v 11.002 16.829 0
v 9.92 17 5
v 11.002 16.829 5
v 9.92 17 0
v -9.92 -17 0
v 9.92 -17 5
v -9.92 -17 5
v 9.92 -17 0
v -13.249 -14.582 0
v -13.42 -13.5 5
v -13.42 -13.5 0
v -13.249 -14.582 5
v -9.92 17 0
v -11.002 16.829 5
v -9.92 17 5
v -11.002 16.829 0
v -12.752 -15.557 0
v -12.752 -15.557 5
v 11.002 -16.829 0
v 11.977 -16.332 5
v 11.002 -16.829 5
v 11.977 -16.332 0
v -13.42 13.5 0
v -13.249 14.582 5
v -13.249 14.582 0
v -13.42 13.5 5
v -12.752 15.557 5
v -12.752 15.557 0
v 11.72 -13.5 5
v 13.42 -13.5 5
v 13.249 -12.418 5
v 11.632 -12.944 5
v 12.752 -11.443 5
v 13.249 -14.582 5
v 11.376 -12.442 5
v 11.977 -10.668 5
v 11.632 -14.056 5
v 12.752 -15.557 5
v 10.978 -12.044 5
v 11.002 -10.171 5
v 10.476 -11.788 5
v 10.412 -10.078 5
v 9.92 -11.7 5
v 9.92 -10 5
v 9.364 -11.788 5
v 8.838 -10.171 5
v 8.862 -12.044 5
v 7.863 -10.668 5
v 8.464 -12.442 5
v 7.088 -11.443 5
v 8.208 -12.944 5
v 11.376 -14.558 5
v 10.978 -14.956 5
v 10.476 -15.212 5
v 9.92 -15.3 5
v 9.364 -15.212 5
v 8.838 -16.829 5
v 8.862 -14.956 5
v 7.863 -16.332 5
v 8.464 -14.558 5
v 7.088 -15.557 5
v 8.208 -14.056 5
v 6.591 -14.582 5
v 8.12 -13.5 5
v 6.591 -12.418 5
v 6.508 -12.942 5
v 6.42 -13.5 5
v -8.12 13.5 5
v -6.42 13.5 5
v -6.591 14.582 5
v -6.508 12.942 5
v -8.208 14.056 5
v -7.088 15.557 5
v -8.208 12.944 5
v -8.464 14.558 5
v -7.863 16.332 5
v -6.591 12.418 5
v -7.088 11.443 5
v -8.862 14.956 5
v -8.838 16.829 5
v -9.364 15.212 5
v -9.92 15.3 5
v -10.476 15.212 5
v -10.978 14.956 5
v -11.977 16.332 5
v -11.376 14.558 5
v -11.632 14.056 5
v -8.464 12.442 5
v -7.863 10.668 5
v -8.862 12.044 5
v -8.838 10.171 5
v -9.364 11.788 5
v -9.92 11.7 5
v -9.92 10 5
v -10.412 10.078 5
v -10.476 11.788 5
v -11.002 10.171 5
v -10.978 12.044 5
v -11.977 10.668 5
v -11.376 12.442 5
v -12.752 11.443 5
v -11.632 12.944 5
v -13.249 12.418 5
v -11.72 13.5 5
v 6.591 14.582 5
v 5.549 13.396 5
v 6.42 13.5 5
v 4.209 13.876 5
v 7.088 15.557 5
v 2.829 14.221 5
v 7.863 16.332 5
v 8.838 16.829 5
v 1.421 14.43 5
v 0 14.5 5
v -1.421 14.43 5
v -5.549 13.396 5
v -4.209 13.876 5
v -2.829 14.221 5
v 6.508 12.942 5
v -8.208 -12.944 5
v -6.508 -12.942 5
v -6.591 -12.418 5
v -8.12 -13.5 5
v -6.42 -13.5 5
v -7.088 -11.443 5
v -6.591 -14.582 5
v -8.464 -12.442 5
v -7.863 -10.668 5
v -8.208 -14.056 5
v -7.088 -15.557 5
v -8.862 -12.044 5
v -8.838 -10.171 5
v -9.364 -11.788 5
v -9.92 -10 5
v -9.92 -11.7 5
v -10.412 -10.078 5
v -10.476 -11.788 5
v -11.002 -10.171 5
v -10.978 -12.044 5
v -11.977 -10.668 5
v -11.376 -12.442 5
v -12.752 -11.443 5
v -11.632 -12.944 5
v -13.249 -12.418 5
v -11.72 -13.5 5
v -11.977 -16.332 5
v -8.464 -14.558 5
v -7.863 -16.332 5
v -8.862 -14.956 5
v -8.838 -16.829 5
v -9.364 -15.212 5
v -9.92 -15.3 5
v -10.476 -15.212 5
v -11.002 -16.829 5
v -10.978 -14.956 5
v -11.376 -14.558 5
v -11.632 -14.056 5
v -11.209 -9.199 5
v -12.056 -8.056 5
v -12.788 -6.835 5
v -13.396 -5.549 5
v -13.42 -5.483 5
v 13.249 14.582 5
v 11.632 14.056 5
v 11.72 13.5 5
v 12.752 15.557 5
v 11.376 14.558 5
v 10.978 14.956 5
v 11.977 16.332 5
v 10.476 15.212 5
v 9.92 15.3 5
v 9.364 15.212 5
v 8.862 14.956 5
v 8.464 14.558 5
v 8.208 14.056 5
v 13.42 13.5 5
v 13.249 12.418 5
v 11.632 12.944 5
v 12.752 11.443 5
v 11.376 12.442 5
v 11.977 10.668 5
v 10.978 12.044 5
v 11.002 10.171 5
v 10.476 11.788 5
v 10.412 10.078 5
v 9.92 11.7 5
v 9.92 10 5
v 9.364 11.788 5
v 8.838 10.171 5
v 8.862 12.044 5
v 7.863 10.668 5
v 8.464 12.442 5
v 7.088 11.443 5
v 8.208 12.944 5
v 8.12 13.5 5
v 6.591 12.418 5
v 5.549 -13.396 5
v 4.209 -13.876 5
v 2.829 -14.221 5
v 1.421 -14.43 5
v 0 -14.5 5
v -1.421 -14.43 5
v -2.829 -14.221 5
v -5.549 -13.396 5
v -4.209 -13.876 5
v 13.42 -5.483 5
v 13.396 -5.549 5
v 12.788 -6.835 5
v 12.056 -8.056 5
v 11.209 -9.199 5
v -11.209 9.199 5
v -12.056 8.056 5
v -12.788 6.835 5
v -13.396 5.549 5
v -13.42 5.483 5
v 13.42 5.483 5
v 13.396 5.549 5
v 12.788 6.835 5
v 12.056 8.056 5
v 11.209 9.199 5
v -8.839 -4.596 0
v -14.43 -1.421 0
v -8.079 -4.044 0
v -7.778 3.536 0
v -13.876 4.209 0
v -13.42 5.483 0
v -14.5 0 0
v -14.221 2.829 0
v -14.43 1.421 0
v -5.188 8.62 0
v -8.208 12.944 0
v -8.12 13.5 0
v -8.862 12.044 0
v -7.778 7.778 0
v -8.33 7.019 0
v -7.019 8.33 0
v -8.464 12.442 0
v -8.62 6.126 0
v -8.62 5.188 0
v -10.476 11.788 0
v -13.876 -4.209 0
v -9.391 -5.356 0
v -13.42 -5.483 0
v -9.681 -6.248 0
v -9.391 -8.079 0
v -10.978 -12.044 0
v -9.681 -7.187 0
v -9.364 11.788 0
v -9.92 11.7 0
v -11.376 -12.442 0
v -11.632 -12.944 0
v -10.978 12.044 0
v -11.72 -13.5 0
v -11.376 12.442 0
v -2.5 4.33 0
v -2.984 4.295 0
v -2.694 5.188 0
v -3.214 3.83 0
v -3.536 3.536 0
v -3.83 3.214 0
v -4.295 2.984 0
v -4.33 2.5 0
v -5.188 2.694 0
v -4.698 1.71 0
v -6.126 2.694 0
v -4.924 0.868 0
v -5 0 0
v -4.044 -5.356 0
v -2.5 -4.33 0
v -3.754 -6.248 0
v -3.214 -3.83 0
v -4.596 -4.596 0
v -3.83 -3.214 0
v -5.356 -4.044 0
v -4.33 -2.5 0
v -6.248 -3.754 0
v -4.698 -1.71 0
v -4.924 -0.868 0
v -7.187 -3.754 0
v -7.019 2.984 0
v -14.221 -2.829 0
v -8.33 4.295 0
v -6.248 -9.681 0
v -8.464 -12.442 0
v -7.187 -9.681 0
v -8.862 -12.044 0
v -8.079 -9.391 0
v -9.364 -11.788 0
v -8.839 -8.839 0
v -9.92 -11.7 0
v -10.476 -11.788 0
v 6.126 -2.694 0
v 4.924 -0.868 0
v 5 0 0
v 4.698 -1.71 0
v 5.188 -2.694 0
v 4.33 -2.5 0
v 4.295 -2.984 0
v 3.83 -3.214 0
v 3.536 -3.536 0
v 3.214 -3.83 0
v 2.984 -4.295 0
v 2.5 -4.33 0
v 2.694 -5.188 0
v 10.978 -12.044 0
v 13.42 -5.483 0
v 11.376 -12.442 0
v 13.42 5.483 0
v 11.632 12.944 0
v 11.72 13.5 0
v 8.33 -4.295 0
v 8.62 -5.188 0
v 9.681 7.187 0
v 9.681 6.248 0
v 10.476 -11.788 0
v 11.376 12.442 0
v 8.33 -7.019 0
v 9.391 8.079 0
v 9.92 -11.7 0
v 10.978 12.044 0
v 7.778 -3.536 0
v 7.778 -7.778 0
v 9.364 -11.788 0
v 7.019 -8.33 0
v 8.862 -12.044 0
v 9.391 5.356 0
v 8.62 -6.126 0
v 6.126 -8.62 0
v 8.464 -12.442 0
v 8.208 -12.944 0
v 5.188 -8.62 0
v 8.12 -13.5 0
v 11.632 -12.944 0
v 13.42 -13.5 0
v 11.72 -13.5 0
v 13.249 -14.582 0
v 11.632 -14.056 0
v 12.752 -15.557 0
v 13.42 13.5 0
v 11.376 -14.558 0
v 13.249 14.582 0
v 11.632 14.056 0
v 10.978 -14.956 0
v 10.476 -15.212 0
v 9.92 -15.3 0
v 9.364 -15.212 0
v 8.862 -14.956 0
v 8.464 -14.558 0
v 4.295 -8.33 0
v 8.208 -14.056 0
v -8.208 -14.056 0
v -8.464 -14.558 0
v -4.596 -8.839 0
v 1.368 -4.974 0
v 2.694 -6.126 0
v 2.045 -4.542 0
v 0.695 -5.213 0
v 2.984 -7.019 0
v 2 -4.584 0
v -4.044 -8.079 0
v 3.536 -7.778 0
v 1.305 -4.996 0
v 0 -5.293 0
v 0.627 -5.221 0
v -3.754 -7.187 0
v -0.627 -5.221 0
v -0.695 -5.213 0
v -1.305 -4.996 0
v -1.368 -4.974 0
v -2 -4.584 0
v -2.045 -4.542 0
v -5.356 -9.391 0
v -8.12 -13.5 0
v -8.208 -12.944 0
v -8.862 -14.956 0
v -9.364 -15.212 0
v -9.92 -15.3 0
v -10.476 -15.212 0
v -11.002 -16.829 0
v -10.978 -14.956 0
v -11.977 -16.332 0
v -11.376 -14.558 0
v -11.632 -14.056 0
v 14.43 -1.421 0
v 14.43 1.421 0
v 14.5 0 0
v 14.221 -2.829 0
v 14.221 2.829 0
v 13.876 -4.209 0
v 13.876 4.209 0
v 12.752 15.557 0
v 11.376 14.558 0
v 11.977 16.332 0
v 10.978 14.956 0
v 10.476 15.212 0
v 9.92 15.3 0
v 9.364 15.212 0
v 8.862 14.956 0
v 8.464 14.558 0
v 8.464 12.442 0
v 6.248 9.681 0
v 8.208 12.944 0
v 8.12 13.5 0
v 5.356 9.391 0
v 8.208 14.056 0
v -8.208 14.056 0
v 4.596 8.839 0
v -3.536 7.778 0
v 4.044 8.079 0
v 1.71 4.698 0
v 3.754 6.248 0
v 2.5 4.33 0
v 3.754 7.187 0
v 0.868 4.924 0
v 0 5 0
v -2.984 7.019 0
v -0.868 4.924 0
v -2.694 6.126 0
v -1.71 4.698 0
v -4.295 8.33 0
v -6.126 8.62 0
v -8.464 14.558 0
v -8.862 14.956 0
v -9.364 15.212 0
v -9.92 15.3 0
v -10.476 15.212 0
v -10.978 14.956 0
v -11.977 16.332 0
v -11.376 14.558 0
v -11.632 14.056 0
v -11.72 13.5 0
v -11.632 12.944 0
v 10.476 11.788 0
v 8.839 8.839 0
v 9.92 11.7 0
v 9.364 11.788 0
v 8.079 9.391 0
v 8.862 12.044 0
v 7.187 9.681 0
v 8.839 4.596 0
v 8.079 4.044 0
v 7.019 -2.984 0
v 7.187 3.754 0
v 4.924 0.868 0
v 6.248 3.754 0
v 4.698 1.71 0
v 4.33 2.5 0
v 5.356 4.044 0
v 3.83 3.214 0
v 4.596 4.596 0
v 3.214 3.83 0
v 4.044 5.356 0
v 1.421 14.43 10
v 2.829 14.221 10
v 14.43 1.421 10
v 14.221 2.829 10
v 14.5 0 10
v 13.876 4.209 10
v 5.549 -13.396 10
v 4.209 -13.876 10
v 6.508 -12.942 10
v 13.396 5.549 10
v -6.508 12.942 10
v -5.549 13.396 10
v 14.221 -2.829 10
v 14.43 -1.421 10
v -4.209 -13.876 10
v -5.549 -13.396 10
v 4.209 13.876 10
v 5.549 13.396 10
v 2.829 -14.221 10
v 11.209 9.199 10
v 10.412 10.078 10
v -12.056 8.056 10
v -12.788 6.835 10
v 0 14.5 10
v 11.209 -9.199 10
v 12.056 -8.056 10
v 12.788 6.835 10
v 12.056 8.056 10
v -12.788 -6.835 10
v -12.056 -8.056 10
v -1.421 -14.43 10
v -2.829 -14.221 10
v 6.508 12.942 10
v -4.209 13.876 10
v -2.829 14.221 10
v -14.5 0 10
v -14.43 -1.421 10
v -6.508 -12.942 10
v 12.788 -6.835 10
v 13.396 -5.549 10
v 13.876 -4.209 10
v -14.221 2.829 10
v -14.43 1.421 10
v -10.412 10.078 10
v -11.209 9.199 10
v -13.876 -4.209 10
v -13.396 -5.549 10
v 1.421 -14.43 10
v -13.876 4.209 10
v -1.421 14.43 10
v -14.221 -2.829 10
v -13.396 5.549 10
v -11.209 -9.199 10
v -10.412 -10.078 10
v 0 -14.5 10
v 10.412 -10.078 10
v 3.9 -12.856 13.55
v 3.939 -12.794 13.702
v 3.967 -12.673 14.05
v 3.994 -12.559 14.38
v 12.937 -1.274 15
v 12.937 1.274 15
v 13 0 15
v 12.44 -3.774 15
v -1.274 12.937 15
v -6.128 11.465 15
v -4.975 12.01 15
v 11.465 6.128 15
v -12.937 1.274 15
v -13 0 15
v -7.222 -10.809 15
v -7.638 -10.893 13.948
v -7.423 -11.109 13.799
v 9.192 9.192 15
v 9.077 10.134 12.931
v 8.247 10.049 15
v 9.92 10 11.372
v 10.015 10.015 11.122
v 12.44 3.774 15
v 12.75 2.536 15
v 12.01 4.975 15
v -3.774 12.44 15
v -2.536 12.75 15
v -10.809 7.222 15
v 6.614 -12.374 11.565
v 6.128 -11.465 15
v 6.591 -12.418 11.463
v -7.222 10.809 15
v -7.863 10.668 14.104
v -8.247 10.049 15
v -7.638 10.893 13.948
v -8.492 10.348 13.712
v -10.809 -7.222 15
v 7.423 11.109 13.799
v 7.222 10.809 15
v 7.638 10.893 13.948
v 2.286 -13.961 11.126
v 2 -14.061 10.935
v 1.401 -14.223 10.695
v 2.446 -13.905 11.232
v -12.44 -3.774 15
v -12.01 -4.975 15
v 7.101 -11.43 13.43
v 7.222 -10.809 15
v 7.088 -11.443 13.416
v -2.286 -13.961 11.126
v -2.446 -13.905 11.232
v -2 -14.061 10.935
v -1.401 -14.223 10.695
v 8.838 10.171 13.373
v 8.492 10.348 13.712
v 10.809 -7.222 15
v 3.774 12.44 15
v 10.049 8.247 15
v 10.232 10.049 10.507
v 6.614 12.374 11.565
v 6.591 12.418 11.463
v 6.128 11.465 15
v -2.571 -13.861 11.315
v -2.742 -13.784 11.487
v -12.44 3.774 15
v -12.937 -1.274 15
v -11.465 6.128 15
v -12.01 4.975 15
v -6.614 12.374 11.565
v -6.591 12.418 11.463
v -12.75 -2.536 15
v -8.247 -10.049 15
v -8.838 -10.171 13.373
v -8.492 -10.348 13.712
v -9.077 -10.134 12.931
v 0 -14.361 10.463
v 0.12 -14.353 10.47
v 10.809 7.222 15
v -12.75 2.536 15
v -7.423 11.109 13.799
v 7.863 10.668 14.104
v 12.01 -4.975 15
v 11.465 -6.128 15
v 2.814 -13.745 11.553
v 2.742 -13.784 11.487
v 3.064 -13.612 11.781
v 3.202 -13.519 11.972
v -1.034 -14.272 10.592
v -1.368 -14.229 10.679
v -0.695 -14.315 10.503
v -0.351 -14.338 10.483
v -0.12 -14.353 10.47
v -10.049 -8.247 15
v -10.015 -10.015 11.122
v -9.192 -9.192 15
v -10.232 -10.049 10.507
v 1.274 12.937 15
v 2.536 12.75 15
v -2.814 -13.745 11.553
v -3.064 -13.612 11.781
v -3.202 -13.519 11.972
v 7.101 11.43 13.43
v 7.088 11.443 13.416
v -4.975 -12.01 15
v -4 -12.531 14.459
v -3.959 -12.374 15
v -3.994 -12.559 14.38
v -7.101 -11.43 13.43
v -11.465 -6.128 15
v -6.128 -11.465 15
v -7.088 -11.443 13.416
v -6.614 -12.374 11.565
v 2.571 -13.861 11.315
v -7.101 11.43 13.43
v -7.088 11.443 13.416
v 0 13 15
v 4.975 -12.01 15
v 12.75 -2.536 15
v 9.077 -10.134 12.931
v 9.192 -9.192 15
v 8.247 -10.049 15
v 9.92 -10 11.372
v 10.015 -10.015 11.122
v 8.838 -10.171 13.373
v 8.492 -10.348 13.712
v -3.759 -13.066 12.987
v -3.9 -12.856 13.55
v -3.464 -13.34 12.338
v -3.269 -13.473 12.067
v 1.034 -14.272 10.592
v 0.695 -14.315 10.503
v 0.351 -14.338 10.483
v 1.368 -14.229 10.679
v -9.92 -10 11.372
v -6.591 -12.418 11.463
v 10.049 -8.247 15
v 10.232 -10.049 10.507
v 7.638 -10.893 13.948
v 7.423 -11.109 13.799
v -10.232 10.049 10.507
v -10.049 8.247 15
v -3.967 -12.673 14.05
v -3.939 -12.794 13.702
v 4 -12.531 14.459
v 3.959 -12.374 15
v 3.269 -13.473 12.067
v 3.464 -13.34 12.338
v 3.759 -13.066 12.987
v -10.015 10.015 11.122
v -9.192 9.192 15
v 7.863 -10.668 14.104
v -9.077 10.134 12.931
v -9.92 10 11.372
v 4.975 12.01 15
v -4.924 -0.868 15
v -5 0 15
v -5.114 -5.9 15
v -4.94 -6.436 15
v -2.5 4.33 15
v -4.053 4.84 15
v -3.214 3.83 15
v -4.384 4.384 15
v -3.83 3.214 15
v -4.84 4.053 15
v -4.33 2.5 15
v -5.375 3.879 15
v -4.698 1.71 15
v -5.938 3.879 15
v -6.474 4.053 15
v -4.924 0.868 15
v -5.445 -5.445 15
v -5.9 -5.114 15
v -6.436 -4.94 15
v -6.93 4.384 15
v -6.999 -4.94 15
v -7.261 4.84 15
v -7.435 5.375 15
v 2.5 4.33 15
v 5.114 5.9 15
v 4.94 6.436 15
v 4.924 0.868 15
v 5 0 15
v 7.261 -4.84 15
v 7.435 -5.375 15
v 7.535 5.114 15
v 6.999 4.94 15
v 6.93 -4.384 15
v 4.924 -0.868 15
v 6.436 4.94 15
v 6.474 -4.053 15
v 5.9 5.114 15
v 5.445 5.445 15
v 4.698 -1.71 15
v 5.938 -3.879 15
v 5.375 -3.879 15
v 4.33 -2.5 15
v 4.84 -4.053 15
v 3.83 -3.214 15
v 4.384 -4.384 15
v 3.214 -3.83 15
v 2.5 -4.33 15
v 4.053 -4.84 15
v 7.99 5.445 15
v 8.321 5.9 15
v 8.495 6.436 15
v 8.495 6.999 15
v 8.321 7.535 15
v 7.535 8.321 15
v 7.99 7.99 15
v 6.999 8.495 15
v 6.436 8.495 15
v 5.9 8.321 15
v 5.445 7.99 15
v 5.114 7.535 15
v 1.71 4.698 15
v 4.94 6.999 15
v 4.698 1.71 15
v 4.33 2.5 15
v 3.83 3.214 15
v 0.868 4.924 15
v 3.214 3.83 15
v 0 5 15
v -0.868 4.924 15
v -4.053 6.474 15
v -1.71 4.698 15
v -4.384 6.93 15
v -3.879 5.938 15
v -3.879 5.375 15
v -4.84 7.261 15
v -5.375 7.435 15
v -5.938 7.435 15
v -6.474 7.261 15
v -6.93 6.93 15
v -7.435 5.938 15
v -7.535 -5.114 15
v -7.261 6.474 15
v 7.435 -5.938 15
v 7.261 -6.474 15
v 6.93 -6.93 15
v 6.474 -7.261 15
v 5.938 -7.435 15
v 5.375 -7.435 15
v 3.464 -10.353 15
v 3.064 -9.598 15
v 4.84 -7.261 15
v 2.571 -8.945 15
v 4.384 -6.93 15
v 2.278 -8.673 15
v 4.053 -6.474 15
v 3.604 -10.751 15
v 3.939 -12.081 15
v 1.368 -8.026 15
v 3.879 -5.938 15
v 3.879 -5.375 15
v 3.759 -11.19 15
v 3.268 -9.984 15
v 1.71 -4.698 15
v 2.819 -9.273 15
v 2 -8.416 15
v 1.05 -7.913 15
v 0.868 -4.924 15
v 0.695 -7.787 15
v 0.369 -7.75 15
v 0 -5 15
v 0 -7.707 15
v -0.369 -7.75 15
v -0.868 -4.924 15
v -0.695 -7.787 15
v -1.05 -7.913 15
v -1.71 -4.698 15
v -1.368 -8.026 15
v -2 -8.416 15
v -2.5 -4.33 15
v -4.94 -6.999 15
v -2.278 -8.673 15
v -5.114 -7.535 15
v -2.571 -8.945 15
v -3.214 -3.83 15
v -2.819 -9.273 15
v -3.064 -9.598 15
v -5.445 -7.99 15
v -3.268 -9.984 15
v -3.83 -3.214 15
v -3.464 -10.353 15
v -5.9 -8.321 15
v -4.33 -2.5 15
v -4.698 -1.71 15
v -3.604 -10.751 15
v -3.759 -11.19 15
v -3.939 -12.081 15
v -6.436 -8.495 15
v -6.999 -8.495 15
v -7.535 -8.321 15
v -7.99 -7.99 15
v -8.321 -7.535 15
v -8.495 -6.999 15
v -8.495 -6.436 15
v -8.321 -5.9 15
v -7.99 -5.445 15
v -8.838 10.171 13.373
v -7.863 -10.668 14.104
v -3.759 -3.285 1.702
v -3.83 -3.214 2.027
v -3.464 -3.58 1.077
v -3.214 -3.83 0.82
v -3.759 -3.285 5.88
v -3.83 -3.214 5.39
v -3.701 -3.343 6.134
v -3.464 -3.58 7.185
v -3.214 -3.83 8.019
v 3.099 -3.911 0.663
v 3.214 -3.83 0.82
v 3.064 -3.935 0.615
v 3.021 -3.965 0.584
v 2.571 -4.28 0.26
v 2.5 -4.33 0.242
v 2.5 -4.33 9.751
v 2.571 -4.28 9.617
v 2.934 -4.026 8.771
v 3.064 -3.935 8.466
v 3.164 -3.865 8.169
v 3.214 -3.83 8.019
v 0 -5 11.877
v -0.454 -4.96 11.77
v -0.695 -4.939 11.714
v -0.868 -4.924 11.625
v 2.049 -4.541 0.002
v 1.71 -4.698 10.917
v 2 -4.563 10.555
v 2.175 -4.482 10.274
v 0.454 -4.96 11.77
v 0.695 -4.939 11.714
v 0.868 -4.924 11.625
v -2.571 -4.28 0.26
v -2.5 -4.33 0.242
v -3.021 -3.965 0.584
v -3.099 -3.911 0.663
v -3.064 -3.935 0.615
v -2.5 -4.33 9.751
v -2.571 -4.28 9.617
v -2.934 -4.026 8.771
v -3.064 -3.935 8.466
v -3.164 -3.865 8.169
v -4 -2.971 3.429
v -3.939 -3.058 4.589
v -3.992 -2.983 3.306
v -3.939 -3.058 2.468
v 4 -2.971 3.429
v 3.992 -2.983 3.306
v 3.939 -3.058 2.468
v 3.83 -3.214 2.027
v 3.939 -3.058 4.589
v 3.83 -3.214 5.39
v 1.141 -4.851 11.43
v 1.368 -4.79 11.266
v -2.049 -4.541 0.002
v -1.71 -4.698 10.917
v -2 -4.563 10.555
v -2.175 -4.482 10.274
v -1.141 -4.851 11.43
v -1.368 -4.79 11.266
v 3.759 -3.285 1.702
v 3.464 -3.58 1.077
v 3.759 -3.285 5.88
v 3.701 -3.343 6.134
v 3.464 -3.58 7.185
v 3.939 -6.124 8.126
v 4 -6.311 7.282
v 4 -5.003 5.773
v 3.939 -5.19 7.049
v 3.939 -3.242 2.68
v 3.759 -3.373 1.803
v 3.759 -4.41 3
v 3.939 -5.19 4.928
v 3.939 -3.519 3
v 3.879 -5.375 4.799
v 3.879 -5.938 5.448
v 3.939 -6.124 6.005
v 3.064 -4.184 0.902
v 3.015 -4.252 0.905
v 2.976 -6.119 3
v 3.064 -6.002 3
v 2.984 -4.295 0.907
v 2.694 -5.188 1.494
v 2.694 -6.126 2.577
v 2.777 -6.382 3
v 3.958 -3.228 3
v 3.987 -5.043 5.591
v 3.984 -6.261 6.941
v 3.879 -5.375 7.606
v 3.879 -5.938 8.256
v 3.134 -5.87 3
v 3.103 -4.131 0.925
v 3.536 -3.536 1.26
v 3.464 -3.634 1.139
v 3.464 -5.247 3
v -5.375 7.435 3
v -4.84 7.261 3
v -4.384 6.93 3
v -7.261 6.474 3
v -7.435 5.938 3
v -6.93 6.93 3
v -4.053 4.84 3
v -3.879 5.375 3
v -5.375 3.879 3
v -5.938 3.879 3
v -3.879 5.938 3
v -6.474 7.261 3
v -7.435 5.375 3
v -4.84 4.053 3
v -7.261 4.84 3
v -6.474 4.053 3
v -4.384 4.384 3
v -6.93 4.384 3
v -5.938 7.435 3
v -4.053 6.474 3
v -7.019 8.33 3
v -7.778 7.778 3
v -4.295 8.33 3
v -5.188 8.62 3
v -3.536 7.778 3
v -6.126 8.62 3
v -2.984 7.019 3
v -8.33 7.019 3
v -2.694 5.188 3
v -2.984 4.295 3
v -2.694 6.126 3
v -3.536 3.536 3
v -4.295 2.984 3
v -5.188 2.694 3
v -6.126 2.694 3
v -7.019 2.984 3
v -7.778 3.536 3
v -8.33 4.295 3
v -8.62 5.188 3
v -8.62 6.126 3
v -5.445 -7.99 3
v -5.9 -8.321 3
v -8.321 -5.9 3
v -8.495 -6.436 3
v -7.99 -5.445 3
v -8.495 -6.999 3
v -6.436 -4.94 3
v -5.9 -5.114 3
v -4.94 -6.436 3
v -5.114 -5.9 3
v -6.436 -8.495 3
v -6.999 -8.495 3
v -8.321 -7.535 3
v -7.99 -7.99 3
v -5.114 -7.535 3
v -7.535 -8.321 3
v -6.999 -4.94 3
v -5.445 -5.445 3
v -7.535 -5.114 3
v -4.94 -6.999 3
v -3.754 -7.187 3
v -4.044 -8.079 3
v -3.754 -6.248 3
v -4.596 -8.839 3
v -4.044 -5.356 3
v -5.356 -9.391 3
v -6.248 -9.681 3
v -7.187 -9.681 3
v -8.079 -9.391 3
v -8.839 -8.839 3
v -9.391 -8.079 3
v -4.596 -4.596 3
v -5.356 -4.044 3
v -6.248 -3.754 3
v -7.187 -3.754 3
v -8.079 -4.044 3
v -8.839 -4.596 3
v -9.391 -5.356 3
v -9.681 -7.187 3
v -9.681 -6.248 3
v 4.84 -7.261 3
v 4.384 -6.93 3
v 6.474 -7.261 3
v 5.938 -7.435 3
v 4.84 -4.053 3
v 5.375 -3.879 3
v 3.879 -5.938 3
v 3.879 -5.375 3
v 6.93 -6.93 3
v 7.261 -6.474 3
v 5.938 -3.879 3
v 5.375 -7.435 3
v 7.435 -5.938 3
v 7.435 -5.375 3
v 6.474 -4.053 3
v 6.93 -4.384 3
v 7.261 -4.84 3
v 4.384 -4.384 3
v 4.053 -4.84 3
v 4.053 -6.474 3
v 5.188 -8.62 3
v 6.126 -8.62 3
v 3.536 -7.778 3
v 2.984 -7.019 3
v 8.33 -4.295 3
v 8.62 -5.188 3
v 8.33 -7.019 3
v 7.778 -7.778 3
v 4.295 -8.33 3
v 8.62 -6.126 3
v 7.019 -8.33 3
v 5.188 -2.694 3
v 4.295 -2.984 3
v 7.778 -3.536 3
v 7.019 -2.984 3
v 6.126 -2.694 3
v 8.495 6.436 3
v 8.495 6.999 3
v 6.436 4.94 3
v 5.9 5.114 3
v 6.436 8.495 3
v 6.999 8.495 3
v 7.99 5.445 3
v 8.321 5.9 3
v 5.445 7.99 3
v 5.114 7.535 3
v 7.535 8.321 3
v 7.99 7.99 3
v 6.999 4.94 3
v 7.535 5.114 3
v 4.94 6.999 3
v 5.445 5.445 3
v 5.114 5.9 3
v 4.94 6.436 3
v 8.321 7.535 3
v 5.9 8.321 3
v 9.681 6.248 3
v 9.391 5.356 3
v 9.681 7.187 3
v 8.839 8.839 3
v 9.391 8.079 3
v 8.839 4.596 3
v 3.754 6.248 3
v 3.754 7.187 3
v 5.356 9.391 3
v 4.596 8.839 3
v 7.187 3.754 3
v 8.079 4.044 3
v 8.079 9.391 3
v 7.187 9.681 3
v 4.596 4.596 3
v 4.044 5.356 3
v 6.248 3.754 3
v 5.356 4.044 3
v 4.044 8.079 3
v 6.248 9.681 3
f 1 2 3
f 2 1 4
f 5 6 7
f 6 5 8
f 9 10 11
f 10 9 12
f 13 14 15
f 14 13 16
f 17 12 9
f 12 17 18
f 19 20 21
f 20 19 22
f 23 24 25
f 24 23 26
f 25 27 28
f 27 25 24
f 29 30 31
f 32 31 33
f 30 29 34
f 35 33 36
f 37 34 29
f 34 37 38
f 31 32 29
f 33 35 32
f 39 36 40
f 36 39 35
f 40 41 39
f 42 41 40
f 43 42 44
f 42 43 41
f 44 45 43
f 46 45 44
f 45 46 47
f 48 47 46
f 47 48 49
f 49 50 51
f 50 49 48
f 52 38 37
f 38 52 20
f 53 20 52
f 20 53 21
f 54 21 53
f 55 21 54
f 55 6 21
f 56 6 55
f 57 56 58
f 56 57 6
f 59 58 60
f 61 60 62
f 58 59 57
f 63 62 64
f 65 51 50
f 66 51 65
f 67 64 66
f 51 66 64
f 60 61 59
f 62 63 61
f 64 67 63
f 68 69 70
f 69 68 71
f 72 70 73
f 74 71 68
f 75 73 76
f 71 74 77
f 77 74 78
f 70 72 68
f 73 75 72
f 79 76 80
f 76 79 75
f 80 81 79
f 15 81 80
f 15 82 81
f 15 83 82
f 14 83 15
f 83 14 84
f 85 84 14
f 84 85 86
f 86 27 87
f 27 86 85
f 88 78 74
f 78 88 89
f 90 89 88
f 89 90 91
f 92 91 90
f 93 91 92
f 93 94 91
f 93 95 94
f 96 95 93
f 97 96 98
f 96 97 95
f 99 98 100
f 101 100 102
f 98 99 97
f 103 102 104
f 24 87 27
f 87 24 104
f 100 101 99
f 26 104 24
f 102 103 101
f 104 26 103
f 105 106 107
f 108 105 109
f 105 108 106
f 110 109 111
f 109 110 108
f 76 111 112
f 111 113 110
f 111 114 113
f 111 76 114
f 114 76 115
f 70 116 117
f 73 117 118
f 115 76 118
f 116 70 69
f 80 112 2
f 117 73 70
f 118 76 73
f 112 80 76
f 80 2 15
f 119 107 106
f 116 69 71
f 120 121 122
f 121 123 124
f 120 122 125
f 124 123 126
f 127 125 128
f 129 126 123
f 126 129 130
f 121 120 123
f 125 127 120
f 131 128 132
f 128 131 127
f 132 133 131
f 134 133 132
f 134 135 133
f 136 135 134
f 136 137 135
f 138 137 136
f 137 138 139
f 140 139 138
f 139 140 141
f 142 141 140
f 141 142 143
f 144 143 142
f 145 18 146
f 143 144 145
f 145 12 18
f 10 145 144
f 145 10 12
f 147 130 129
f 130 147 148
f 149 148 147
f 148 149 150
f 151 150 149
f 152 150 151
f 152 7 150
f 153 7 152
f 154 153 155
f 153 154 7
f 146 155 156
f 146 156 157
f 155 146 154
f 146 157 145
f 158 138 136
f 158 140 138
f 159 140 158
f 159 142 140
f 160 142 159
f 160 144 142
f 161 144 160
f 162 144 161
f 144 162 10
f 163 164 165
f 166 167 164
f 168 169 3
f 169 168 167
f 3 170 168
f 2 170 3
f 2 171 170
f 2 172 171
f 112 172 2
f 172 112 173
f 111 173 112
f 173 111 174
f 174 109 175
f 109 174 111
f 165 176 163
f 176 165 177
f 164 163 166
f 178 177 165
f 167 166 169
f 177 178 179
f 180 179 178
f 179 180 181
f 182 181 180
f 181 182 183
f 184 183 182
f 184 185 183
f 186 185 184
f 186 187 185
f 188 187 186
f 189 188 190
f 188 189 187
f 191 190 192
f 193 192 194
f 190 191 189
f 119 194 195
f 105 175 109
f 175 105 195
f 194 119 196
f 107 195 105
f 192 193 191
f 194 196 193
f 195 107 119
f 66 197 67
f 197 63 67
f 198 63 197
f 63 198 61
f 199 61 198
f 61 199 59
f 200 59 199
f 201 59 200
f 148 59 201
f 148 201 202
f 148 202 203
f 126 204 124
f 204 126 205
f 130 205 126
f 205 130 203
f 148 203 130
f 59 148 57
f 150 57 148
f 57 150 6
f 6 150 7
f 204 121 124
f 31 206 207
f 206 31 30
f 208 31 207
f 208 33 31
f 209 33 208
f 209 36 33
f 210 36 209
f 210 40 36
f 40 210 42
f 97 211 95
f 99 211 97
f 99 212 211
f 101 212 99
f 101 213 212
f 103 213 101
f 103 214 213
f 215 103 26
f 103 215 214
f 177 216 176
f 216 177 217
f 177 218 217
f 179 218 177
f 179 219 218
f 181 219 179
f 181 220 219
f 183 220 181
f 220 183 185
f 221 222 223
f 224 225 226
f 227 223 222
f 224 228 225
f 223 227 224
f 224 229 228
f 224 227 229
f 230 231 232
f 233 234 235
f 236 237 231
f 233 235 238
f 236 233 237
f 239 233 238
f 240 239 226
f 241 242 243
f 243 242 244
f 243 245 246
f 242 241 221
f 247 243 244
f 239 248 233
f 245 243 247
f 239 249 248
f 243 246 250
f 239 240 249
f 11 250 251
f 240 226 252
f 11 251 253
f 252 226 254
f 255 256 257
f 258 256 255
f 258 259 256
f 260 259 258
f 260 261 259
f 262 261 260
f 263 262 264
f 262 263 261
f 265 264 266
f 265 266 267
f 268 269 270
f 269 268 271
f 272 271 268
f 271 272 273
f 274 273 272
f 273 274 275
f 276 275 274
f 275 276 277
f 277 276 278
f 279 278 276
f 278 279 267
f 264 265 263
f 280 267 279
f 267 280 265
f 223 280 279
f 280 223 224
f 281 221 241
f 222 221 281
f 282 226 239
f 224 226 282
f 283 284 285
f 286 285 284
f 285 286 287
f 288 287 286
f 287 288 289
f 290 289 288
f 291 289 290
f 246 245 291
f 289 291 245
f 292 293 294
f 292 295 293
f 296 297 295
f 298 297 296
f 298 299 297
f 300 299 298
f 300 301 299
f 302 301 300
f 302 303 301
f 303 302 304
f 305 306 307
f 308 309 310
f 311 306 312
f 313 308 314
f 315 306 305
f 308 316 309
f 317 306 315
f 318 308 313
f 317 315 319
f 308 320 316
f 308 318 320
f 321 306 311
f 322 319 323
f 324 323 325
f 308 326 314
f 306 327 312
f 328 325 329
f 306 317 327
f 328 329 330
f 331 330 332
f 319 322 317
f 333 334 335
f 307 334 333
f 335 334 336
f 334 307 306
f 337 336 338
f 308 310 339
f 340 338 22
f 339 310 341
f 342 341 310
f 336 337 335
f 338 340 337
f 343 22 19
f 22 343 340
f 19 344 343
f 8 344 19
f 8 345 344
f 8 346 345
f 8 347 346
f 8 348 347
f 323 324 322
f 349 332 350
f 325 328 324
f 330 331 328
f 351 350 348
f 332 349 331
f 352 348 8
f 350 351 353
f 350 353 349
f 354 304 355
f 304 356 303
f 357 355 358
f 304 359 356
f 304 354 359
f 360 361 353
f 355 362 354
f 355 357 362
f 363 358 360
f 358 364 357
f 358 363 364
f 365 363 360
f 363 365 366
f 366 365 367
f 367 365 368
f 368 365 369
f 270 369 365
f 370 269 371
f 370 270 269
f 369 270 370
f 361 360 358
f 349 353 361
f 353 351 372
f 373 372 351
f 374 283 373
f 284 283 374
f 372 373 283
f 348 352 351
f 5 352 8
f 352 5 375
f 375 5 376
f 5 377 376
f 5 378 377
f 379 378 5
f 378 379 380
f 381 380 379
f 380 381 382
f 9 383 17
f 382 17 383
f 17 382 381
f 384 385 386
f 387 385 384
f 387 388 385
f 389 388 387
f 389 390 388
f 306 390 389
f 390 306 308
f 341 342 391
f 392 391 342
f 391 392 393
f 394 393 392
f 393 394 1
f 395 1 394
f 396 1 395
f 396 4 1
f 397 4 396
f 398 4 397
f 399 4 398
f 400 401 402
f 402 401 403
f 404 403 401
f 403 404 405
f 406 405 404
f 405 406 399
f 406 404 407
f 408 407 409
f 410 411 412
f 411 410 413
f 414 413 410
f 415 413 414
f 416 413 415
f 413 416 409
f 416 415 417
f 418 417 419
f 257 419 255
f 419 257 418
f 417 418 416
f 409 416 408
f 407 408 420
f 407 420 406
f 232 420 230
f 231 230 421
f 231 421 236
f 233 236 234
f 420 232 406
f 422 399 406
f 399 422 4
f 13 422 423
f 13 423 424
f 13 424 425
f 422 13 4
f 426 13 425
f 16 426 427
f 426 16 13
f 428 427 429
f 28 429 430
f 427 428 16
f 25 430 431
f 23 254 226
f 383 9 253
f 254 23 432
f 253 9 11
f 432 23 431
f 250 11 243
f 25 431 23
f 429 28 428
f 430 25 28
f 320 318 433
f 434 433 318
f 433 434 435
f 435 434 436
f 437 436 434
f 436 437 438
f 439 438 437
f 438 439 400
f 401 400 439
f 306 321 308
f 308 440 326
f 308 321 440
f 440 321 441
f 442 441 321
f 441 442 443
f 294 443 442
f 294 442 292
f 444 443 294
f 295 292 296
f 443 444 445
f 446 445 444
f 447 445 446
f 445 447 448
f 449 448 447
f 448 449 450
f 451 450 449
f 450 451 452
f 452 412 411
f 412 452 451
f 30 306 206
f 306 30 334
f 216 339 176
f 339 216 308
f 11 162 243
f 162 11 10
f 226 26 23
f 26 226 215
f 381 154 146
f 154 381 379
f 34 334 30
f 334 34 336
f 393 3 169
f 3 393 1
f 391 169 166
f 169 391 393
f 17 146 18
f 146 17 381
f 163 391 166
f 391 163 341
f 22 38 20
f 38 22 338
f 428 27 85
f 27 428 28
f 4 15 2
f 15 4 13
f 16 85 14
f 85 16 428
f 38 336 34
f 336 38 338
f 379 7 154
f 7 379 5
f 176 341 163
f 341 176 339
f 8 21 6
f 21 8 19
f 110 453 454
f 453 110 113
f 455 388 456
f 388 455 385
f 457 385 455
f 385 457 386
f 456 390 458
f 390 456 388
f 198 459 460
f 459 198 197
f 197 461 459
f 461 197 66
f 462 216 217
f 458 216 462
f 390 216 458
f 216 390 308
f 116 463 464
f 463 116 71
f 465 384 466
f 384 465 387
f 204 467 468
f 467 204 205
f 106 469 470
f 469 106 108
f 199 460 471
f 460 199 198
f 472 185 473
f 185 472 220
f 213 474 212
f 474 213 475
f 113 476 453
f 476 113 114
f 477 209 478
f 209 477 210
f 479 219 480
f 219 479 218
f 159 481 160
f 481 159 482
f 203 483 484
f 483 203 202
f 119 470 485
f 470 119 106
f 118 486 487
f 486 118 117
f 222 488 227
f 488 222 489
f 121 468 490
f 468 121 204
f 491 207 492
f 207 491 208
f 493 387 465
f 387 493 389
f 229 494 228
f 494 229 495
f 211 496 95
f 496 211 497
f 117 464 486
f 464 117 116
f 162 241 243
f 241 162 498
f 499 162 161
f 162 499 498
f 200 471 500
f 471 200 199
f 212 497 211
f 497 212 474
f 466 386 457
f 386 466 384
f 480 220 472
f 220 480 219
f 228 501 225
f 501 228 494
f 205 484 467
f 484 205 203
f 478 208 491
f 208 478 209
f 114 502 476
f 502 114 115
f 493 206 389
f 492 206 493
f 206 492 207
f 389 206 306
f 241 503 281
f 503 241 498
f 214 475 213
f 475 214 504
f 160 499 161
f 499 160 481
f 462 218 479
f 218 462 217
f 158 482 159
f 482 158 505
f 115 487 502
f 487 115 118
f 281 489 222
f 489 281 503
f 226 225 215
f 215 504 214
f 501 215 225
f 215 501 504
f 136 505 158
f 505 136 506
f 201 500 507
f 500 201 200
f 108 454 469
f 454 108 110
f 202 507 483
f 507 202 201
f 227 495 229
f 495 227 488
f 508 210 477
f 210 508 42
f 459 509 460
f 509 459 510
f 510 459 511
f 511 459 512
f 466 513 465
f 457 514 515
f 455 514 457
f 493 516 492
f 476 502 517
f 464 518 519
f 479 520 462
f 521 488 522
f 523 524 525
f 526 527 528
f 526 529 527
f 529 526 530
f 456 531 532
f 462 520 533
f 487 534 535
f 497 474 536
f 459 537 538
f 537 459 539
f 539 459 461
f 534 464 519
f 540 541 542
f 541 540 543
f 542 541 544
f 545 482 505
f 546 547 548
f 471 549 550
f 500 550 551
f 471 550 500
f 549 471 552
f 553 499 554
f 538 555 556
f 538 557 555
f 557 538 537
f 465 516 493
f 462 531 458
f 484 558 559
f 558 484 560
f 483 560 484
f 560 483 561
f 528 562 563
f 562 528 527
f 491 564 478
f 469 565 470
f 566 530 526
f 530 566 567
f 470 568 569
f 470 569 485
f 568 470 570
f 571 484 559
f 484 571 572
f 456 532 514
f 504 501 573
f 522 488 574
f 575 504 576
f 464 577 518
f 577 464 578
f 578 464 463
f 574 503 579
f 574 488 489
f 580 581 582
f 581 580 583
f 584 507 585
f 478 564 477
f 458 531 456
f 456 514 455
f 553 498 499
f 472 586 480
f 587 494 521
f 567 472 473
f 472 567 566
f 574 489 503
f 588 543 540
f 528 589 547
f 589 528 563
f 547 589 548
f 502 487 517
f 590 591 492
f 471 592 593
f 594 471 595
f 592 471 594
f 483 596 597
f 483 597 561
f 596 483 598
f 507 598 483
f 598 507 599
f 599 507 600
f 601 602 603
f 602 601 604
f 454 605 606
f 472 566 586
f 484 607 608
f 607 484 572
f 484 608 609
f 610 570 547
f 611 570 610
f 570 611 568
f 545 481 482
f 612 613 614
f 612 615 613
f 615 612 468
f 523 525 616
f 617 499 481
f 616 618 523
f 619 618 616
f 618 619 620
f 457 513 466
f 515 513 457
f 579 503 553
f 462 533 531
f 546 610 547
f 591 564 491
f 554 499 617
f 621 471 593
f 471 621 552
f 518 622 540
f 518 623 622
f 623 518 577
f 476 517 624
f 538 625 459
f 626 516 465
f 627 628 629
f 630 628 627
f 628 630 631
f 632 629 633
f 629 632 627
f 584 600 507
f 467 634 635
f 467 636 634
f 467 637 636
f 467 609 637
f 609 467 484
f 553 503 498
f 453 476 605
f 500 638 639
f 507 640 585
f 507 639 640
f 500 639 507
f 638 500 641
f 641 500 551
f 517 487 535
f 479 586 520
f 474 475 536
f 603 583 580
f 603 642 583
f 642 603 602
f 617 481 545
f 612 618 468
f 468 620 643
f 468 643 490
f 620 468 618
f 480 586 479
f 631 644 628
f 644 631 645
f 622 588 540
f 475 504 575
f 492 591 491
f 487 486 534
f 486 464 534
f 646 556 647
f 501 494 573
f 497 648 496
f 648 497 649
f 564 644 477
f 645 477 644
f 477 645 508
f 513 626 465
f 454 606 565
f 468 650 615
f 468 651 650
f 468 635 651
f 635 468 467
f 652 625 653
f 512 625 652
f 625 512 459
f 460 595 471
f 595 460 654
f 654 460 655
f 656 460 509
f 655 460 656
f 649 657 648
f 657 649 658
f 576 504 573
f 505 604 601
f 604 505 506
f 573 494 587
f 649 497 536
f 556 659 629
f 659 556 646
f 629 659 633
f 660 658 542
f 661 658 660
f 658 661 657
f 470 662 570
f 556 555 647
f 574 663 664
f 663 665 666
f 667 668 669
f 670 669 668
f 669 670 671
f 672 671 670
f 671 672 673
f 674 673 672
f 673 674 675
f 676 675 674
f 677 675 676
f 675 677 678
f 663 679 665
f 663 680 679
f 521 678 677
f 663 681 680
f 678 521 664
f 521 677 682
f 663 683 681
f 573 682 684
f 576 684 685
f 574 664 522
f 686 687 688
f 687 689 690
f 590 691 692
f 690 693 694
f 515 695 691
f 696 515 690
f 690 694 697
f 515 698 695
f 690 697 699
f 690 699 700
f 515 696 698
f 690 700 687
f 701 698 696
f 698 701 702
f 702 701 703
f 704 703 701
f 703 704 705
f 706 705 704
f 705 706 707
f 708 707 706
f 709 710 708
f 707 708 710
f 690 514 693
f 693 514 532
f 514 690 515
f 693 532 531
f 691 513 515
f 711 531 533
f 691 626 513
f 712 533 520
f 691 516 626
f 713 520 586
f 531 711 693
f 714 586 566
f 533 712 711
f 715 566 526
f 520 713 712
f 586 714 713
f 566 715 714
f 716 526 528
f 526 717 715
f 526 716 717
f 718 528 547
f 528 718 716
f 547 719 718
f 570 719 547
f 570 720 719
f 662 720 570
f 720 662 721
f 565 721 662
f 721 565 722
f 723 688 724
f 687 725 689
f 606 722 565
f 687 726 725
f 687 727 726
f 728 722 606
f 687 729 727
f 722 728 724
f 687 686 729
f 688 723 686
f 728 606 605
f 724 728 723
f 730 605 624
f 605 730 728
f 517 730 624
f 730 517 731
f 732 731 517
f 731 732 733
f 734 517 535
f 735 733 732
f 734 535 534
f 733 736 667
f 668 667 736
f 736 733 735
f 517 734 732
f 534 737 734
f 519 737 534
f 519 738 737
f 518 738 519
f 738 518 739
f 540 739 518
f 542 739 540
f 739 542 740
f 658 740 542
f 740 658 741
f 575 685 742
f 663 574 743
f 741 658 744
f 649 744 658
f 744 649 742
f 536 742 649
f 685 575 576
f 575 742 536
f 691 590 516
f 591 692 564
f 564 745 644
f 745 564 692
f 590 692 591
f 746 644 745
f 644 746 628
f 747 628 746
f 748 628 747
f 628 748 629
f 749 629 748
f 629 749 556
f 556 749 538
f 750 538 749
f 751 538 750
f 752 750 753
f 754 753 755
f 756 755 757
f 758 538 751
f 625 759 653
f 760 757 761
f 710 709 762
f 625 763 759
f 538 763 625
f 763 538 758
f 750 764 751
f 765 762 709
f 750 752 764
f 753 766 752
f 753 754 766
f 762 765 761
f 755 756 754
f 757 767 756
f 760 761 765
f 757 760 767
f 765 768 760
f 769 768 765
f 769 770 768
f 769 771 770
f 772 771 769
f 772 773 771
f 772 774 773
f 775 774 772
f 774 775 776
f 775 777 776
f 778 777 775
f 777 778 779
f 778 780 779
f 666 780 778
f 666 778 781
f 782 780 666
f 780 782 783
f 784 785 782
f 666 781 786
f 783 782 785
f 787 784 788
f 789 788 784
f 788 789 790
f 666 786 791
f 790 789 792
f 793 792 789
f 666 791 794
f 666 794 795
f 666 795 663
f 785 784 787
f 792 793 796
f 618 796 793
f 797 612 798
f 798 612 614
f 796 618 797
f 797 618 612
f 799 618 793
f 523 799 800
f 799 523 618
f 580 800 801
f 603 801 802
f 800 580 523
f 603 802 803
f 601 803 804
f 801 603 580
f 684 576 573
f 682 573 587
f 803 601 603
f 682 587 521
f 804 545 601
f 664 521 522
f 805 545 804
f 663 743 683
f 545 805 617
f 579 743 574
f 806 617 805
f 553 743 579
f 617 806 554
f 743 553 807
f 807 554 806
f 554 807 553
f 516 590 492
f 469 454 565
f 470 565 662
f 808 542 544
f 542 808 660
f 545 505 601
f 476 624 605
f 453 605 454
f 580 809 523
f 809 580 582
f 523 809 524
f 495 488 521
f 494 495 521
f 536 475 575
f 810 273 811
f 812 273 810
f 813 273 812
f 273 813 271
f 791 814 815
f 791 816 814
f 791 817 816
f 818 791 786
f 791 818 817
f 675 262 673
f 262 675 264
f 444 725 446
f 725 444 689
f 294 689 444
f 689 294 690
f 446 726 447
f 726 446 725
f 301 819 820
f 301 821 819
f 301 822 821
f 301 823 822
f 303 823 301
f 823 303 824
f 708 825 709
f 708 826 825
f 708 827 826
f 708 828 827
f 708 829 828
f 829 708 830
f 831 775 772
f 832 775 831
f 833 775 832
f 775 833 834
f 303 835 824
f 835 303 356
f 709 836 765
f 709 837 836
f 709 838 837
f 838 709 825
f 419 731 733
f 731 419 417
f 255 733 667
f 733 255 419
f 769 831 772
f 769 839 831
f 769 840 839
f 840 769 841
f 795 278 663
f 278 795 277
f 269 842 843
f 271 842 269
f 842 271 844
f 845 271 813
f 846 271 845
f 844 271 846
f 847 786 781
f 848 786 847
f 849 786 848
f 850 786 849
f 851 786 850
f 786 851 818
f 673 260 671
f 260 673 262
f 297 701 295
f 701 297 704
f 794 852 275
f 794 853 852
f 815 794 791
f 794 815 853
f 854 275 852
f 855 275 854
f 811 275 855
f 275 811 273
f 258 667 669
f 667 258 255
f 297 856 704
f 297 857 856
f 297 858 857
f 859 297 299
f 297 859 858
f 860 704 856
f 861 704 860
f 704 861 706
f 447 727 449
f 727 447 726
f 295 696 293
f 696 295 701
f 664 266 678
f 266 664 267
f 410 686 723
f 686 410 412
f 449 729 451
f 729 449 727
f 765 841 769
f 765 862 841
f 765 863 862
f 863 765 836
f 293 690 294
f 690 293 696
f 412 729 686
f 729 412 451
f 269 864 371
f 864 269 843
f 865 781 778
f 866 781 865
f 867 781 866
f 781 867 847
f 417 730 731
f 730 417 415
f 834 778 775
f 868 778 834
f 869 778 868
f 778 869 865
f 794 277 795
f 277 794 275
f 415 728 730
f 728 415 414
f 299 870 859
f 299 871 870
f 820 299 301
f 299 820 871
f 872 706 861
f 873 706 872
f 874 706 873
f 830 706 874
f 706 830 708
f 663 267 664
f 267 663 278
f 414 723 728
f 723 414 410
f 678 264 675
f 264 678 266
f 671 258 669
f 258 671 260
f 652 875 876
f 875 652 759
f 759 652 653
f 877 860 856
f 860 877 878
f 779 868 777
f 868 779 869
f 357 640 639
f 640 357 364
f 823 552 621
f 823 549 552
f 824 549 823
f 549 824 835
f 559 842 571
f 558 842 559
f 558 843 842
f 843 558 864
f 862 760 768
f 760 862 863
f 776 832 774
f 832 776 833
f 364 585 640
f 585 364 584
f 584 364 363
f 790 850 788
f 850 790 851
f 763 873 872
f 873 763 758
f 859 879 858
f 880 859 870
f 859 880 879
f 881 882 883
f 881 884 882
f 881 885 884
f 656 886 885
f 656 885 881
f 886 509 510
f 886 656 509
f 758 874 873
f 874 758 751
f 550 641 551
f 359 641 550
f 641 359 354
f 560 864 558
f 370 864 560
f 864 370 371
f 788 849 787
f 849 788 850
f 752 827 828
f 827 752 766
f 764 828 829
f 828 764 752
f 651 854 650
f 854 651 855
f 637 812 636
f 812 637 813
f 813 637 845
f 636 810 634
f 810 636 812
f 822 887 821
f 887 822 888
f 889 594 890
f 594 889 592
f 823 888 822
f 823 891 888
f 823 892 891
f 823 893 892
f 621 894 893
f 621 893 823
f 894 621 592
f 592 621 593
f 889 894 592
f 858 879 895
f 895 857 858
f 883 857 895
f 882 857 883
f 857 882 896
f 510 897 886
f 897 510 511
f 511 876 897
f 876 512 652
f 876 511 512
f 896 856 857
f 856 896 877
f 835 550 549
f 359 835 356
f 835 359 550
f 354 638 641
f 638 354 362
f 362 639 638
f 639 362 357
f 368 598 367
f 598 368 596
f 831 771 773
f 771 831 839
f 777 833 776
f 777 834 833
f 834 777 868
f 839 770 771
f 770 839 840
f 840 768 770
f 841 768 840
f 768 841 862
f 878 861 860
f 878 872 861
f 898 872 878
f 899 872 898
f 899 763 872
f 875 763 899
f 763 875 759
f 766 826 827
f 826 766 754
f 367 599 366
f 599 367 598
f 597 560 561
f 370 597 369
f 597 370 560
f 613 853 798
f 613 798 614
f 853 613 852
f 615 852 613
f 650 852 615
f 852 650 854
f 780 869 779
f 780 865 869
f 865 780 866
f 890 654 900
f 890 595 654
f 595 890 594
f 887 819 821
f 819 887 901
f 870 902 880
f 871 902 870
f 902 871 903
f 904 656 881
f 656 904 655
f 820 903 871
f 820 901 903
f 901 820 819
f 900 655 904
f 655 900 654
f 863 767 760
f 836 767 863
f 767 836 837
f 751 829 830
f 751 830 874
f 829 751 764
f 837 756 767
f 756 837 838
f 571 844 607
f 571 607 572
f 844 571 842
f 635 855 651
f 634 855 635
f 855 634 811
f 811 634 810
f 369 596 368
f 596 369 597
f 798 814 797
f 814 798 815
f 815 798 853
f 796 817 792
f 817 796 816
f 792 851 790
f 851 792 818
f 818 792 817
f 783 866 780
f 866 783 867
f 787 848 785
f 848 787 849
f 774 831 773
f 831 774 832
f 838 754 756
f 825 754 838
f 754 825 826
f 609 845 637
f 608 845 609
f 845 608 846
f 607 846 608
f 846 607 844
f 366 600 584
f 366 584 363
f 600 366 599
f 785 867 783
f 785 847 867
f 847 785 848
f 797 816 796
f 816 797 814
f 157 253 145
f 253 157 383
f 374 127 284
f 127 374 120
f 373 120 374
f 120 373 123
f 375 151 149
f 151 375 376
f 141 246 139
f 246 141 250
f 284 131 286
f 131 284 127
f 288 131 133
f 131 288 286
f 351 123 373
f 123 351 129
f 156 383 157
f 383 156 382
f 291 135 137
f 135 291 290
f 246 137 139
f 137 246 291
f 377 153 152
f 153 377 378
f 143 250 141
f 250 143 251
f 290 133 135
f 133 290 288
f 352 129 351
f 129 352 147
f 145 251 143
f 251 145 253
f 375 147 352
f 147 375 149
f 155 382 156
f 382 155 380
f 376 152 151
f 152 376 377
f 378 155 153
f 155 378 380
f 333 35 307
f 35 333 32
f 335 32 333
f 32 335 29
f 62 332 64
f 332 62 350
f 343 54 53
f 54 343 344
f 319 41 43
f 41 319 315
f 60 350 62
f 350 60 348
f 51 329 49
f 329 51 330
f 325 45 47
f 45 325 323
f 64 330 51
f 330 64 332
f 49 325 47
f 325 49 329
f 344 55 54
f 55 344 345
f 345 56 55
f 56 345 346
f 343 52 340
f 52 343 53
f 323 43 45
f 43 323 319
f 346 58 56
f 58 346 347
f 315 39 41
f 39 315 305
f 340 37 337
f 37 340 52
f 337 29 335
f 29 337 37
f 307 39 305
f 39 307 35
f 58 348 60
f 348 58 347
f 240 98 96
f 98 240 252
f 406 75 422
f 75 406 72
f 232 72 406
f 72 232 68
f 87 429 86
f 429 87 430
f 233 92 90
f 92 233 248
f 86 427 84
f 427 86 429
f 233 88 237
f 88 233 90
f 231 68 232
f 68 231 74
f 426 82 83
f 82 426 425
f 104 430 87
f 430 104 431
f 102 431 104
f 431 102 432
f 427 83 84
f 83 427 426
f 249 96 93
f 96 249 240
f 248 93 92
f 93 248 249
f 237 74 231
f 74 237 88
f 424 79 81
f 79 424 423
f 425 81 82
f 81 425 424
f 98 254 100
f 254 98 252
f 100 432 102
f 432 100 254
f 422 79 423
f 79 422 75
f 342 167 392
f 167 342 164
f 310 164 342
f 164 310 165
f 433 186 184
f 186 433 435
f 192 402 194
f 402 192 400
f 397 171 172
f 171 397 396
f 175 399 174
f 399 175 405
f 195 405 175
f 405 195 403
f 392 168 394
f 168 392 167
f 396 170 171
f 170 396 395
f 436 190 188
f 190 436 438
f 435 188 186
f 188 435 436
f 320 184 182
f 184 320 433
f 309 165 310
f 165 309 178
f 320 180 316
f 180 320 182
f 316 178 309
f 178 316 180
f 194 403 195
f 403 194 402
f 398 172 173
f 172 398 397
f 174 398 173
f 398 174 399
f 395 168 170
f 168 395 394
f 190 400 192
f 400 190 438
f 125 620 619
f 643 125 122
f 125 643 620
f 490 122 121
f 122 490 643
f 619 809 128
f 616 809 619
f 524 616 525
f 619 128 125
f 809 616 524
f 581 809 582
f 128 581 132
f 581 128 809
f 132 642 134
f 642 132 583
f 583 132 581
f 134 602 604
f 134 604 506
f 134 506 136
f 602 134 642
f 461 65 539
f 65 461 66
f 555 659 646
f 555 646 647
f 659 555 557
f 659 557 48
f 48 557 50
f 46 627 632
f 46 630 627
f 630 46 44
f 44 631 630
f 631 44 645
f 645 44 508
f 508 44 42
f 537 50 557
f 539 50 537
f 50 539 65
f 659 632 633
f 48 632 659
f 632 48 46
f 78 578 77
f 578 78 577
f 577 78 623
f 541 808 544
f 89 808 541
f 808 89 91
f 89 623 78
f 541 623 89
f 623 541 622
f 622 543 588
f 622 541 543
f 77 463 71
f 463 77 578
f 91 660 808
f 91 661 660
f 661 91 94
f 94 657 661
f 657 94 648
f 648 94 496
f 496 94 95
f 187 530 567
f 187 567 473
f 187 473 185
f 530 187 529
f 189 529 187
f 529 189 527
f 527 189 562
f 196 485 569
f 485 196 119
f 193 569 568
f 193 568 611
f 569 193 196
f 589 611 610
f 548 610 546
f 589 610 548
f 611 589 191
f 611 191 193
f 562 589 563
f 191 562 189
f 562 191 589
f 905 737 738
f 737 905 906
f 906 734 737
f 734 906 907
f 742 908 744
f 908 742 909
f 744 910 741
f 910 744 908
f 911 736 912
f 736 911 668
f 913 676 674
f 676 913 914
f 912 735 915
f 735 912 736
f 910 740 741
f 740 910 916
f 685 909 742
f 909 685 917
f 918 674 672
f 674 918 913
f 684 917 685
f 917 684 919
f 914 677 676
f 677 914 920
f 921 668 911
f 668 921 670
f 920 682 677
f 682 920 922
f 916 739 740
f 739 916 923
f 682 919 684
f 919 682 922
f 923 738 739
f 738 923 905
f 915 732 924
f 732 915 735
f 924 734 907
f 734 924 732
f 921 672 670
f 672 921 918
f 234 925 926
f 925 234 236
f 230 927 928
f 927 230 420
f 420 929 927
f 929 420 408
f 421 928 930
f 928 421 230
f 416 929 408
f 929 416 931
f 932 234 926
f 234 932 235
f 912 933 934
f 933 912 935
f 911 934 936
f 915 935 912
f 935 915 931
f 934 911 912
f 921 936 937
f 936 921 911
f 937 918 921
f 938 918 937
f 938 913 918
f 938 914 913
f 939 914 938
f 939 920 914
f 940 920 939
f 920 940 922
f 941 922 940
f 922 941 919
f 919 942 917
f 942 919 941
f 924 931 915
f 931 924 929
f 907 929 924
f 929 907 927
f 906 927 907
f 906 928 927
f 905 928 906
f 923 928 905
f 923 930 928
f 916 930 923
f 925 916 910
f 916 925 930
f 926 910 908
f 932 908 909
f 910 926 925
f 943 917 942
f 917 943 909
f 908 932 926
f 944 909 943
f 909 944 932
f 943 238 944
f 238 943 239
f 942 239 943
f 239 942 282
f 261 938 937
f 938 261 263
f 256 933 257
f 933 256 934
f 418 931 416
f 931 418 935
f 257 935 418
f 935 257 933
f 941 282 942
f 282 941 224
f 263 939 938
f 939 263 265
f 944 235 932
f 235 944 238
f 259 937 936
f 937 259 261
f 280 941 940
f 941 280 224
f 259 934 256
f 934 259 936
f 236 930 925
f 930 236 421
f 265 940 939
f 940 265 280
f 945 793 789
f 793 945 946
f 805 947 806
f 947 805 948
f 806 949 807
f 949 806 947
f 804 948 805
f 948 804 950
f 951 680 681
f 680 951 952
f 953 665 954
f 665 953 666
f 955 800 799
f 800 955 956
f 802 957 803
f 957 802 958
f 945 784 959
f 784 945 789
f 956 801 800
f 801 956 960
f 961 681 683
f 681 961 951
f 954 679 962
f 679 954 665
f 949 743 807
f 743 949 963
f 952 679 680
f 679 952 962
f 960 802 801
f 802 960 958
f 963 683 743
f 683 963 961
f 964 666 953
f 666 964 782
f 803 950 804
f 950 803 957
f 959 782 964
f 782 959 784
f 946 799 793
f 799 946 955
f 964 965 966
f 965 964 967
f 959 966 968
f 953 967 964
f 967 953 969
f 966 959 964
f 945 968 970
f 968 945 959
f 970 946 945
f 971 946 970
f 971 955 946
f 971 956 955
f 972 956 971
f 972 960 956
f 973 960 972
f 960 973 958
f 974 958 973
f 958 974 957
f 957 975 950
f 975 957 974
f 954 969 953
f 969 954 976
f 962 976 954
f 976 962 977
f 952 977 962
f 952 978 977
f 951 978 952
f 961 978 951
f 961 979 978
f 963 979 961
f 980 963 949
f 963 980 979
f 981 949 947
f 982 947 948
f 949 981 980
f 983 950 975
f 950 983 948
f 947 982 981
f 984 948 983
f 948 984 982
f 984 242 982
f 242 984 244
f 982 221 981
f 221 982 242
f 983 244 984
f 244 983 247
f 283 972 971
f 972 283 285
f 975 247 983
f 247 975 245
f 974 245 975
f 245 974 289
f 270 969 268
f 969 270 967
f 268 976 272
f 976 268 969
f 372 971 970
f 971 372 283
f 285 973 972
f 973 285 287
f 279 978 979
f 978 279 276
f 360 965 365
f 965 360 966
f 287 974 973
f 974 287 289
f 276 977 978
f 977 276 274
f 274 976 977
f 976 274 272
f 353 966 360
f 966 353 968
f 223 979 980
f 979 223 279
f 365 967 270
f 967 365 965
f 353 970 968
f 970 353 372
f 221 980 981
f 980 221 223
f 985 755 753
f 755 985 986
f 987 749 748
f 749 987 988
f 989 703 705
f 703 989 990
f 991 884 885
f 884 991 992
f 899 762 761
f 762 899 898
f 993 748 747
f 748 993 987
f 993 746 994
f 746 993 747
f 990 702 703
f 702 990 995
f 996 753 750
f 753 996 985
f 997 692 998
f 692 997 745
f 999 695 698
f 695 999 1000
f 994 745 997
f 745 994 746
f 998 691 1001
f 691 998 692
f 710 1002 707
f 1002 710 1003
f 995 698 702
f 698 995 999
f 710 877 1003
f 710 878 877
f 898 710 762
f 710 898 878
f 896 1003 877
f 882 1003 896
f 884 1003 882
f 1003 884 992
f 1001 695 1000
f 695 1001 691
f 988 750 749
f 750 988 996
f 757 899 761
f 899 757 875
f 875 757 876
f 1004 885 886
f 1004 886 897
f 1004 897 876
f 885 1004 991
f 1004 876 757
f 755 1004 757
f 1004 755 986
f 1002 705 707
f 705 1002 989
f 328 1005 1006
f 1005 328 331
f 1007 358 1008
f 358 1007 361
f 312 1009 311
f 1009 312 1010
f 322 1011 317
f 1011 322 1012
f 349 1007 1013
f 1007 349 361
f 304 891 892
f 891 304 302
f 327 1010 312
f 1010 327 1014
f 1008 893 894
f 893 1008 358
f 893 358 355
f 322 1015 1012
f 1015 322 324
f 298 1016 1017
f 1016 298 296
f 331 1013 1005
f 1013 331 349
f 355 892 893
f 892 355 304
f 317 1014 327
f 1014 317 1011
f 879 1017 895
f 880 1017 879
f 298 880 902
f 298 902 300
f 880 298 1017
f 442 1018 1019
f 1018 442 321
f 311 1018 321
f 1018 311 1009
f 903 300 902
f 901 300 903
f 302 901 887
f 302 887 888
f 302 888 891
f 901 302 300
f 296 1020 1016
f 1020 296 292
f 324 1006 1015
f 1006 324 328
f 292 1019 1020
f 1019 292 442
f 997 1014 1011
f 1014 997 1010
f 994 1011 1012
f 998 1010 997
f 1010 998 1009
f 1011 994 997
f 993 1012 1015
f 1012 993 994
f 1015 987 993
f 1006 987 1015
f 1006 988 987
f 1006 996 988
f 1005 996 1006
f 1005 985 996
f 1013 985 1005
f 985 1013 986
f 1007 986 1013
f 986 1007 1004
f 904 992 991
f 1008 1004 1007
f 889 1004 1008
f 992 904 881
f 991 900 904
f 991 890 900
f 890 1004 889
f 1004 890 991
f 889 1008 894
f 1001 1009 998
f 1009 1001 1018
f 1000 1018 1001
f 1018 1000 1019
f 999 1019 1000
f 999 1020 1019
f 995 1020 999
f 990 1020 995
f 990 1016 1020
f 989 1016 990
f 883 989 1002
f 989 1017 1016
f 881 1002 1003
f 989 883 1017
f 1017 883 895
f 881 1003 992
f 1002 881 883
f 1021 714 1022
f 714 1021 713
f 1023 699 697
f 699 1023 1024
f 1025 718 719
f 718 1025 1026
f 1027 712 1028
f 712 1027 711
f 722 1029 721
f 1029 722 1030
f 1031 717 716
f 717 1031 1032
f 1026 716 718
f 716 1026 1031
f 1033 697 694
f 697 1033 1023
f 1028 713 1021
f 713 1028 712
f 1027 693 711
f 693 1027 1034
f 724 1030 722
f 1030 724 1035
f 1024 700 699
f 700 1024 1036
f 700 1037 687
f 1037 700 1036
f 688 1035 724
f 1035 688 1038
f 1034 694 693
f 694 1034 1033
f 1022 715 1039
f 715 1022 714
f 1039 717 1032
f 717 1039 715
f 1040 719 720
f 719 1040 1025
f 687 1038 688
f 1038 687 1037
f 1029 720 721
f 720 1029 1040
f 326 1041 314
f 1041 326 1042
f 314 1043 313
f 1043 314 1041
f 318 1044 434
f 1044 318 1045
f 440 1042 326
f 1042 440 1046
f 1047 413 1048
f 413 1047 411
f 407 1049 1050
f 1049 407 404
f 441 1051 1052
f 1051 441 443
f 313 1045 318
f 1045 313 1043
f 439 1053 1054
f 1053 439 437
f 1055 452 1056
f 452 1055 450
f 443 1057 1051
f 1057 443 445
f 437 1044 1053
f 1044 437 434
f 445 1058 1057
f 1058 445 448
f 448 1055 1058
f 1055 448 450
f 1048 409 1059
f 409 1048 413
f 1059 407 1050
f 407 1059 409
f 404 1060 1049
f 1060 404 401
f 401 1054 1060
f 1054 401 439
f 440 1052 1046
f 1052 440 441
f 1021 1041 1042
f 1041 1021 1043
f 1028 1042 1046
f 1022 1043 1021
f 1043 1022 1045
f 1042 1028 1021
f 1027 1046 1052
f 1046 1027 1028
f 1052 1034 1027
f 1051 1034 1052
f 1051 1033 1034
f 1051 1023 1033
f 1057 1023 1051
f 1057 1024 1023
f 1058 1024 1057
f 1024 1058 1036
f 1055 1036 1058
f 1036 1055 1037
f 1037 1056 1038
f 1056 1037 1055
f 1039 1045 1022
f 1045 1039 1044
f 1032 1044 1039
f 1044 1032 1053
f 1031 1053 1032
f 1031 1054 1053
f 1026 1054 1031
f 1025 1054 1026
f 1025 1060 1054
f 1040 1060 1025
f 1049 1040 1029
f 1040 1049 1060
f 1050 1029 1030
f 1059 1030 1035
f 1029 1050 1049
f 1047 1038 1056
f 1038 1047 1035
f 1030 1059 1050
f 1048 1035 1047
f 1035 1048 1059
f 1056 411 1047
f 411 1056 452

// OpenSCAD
//Brushless-cox mount.
//Parametric.
//Oktay Gülmez, 6/11/2014.
//GNU_GPL_V3


//Parameters:
//-45 degree motor mount holes distance(16 or 19).
a=16;
//+45 degree motor mount holes distance(16 or 19).
b=19; 
//Block height(10 to 30).
height=15; 


$fn=20;

difference(){
  union(){
    minkowski(){
      translate([-9.92,-13.5,0]) cube([19.84,27,4]);
        cylinder(r=3.5);
    }

   translate([0,0,0]) cylinder(h=height-5, r=14.5, $fn=64);
   translate([0,0,height-5]) cylinder(h=5, r1=14.5, r2=13, $fn=64);

   
  }
   translate([0,0,-1]) cylinder(h=50, r=5, $fn=36);

   translate([0,0,0]) rotate([atan(13/height),0,0]) cylinder(h=height+20, r=4, $fn=36);

   translate([-9.92,-13.5,-1]) cylinder(h=10, r=1.8); 
   translate([9.92,-13.5,-1]) cylinder(h=10, r=1.8); 
   translate([-9.92,13.5,-1]) cylinder(h=10, r=1.8); 
   translate([9.92,13.5,-1]) cylinder(h=10, r=1.8);

   translate([-9.92,-13.5,5]) cylinder(h=50, r=3.5); 
   translate([9.92,-13.5,5]) cylinder(h=50, r=3.5); 
   translate([-9.92,13.5,5]) cylinder(h=50, r=3.5); 
   translate([9.92,13.5,5]) cylinder(h=50, r=3.5);

   rotate([0, 0, 45])
    translate([0, a/2, -1])
    cylinder(h=50, r=1.8);
   rotate([0, 0, 45])
    translate([0, a/2, -1])
    cylinder(h=4, r=3);

  rotate([0, 0, 135])
    translate([0, b/2, -1])
    cylinder(h=50, r=1.8);
  rotate([0, 0, 135])
    translate([0, b/2, -1])
    cylinder(h=4, r=3);

  rotate([0, 0, 225])
    translate([0, a/2, -1])
    cylinder(h=50, r=1.8);
  rotate([0, 0, 225])
    translate([0, a/2, -1])
    cylinder(h=4, r=3);

   rotate([0, 0, 315])
    translate([0, b/2, -1])
    cylinder(h=50, r=1.8);
   rotate([0, 0, 315])
    translate([0, b/2, -1])
    cylinder(h=4, r=3);

}
